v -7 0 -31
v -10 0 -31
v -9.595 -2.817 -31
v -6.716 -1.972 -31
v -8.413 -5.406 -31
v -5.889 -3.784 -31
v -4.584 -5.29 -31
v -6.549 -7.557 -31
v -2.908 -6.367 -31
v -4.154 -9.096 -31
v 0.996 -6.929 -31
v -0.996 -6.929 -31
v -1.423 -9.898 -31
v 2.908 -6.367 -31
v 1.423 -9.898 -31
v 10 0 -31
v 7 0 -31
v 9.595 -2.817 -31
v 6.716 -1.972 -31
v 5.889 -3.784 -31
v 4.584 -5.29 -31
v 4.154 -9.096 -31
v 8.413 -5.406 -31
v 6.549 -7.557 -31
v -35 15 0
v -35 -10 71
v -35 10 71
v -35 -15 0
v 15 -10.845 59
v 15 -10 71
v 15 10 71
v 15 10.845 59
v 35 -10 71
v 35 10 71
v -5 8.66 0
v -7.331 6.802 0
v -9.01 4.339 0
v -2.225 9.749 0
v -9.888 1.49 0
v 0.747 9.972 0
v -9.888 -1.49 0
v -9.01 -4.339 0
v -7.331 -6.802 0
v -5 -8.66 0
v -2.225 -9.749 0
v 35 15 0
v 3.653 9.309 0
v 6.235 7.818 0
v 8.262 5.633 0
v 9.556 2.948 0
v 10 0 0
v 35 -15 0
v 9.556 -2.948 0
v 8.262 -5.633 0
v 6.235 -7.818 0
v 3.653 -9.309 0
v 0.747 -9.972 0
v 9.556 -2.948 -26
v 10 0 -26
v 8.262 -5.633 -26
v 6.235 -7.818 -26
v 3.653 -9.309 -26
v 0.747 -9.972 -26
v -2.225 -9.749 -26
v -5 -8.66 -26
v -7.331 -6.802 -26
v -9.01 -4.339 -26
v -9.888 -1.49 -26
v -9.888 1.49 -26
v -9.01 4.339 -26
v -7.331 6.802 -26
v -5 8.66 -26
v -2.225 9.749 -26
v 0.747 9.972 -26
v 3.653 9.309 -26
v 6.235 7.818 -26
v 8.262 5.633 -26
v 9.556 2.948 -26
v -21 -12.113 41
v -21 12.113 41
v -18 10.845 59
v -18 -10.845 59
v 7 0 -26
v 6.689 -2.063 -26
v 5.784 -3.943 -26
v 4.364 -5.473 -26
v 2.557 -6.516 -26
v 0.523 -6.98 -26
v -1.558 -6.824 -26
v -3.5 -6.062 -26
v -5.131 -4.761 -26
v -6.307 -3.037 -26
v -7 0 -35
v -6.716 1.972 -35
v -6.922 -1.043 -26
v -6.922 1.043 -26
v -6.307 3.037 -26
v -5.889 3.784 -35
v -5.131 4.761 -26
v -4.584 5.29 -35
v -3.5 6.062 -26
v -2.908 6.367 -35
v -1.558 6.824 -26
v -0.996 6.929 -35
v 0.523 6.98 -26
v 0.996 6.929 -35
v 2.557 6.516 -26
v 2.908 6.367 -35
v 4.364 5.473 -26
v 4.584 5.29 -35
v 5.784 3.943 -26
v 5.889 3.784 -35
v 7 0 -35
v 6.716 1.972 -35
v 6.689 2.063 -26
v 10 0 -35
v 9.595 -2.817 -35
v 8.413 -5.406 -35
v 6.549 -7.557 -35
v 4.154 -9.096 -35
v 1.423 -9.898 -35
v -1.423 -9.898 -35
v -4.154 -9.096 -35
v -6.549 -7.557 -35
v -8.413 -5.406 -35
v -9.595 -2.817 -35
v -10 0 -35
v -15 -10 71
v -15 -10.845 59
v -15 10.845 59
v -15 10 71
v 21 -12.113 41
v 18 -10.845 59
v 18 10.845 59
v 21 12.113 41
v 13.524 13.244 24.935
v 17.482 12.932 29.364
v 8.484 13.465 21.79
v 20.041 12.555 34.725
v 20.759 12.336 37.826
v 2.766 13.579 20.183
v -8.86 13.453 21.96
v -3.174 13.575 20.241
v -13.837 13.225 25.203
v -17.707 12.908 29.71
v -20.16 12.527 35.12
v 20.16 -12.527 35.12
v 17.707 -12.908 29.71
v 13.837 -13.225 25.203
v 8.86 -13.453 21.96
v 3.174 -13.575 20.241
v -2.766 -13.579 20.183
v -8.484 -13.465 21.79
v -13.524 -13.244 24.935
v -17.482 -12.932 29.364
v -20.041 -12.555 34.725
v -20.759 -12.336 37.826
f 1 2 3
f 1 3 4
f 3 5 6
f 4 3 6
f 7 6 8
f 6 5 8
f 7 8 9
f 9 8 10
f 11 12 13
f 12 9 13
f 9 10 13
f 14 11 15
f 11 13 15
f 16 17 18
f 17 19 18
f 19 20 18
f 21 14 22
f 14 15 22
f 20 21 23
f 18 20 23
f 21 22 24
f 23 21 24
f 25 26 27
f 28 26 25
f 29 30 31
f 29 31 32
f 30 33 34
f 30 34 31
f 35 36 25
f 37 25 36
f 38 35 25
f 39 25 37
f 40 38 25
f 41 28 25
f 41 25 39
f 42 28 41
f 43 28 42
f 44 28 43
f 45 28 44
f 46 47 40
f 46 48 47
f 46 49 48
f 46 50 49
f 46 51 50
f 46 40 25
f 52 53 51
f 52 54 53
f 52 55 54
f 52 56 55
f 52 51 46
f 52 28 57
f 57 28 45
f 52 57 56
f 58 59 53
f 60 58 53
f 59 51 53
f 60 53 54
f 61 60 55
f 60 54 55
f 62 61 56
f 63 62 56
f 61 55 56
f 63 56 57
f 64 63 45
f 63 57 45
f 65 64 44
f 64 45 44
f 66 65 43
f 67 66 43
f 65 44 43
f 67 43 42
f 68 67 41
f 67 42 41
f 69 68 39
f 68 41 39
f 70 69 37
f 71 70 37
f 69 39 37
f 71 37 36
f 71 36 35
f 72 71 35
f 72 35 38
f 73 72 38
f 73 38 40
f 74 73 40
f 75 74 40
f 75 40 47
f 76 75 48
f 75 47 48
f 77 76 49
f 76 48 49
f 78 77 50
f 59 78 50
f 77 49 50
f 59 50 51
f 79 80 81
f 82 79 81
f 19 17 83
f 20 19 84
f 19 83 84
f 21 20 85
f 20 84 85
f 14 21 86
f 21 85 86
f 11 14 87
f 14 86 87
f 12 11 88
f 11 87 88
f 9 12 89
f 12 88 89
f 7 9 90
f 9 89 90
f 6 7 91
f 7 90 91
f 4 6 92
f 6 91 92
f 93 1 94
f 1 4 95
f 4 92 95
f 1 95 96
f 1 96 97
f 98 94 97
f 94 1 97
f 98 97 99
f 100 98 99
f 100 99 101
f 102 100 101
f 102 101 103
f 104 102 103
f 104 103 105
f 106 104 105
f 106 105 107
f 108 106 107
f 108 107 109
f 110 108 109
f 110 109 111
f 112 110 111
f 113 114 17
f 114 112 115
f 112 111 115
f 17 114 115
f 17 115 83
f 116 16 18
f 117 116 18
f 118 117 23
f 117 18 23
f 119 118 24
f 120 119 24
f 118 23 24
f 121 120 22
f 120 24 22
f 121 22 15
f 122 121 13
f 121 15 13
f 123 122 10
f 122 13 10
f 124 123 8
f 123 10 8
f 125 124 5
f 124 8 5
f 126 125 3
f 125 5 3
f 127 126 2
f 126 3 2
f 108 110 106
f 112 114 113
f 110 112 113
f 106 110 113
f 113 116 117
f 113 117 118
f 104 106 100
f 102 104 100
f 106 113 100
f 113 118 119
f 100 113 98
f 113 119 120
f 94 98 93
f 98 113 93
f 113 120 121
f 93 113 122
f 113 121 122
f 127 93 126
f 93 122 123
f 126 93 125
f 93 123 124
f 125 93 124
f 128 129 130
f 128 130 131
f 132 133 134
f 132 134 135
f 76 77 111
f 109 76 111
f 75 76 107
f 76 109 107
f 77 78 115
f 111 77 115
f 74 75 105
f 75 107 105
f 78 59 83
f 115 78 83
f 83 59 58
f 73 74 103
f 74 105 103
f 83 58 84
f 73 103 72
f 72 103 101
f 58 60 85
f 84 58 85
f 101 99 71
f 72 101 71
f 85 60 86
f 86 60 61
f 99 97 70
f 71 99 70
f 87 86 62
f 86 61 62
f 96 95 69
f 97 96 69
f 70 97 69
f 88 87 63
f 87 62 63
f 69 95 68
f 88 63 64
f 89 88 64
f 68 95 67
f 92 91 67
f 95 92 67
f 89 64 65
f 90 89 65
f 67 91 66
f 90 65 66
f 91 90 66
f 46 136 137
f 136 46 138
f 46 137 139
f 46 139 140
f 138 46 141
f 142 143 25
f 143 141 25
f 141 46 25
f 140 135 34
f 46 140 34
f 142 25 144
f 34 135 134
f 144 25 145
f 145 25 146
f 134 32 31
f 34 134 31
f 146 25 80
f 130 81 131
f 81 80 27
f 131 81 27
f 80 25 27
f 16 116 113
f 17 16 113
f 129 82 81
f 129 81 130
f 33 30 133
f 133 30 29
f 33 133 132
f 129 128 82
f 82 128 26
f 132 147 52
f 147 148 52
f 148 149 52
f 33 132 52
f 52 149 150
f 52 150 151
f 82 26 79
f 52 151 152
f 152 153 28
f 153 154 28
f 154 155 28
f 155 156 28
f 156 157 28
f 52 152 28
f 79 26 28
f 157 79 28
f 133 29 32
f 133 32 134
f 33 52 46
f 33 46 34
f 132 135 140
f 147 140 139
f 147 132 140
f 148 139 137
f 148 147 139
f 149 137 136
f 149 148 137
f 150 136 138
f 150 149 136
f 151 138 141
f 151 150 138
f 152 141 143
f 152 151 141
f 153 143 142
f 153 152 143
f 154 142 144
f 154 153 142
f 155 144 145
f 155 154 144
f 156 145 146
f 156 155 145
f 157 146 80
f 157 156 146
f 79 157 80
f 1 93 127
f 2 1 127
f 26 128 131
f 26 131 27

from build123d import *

# Parameters (mm, degrees)
F1_DEPTH = 15
F3_DEPTH = 70.001
F7_DEPTH = 6


with BuildPart() as f1:
    # F0 (on Front) → F1 (new body, symmetric)
    with BuildSketch(Plane.XZ):
        with BuildLine():
            Line((-35, 71), (-35, 0))
            Line((-35, 0), (35, 0))
            Line((35, 0), (35, 71))
            Line((35, 71), (15, 71))
            Line((15, 71), (15, 59))
            Line((15, 59), (18, 59))
            Line((18, 59), (21, 41))
            ThreePointArc((21, 41), (0, 20), (-21, 41))
            Line((-21, 41), (-18, 59))
            Line((-18, 59), (-15, 59))
            Line((-15, 59), (-15, 71))
            Line((-15, 71), (-35, 71))
        make_face()
    extrude(amount=F1_DEPTH, both=True)

    # F2 (on face) → F3 (cut, through all)
    with BuildSketch(Plane(origin=(-35, 0, 0), x_dir=(0, -1, 0), z_dir=(-1, 0, 0))):
        Polygon((-10, 71), (-15, 71), (-15, 0), align=None)
        Polygon((10, 71), (15, 0), (15, 71), align=None)
    extrude(amount=-F3_DEPTH, mode=Mode.SUBTRACT)

    # F4 (on Front) → F5 (revolve)
    with BuildSketch(Plane.XZ):
        Polygon((10, 0), (0, 0), (0, -35), (10, -35), (10, -31), (7, -31), (7, -26), (10, -26), align=None)
    revolve(axis=Axis((0, 0, -17.5), (0, 0, -1)))

    # F6 (on face) → F7 (cut)
    with BuildSketch(Plane(origin=(0, 0, -35), x_dir=(1, 0, 0), z_dir=(0, 0, -1))):
        with BuildLine():
            Line((17, 0), (7, 0))
            ThreePointArc((7, 0), (0, -7), (-7, 0))
            Line((-7, 0), (-17, 0))
            Line((-17, 0), (-17, -25.996203))
            Line((-17, -25.996203), (17, -25.996203))
            Line((17, -25.996203), (17, 0))
        make_face()
    extrude(amount=-F7_DEPTH, mode=Mode.SUBTRACT)


solid = f1.part
